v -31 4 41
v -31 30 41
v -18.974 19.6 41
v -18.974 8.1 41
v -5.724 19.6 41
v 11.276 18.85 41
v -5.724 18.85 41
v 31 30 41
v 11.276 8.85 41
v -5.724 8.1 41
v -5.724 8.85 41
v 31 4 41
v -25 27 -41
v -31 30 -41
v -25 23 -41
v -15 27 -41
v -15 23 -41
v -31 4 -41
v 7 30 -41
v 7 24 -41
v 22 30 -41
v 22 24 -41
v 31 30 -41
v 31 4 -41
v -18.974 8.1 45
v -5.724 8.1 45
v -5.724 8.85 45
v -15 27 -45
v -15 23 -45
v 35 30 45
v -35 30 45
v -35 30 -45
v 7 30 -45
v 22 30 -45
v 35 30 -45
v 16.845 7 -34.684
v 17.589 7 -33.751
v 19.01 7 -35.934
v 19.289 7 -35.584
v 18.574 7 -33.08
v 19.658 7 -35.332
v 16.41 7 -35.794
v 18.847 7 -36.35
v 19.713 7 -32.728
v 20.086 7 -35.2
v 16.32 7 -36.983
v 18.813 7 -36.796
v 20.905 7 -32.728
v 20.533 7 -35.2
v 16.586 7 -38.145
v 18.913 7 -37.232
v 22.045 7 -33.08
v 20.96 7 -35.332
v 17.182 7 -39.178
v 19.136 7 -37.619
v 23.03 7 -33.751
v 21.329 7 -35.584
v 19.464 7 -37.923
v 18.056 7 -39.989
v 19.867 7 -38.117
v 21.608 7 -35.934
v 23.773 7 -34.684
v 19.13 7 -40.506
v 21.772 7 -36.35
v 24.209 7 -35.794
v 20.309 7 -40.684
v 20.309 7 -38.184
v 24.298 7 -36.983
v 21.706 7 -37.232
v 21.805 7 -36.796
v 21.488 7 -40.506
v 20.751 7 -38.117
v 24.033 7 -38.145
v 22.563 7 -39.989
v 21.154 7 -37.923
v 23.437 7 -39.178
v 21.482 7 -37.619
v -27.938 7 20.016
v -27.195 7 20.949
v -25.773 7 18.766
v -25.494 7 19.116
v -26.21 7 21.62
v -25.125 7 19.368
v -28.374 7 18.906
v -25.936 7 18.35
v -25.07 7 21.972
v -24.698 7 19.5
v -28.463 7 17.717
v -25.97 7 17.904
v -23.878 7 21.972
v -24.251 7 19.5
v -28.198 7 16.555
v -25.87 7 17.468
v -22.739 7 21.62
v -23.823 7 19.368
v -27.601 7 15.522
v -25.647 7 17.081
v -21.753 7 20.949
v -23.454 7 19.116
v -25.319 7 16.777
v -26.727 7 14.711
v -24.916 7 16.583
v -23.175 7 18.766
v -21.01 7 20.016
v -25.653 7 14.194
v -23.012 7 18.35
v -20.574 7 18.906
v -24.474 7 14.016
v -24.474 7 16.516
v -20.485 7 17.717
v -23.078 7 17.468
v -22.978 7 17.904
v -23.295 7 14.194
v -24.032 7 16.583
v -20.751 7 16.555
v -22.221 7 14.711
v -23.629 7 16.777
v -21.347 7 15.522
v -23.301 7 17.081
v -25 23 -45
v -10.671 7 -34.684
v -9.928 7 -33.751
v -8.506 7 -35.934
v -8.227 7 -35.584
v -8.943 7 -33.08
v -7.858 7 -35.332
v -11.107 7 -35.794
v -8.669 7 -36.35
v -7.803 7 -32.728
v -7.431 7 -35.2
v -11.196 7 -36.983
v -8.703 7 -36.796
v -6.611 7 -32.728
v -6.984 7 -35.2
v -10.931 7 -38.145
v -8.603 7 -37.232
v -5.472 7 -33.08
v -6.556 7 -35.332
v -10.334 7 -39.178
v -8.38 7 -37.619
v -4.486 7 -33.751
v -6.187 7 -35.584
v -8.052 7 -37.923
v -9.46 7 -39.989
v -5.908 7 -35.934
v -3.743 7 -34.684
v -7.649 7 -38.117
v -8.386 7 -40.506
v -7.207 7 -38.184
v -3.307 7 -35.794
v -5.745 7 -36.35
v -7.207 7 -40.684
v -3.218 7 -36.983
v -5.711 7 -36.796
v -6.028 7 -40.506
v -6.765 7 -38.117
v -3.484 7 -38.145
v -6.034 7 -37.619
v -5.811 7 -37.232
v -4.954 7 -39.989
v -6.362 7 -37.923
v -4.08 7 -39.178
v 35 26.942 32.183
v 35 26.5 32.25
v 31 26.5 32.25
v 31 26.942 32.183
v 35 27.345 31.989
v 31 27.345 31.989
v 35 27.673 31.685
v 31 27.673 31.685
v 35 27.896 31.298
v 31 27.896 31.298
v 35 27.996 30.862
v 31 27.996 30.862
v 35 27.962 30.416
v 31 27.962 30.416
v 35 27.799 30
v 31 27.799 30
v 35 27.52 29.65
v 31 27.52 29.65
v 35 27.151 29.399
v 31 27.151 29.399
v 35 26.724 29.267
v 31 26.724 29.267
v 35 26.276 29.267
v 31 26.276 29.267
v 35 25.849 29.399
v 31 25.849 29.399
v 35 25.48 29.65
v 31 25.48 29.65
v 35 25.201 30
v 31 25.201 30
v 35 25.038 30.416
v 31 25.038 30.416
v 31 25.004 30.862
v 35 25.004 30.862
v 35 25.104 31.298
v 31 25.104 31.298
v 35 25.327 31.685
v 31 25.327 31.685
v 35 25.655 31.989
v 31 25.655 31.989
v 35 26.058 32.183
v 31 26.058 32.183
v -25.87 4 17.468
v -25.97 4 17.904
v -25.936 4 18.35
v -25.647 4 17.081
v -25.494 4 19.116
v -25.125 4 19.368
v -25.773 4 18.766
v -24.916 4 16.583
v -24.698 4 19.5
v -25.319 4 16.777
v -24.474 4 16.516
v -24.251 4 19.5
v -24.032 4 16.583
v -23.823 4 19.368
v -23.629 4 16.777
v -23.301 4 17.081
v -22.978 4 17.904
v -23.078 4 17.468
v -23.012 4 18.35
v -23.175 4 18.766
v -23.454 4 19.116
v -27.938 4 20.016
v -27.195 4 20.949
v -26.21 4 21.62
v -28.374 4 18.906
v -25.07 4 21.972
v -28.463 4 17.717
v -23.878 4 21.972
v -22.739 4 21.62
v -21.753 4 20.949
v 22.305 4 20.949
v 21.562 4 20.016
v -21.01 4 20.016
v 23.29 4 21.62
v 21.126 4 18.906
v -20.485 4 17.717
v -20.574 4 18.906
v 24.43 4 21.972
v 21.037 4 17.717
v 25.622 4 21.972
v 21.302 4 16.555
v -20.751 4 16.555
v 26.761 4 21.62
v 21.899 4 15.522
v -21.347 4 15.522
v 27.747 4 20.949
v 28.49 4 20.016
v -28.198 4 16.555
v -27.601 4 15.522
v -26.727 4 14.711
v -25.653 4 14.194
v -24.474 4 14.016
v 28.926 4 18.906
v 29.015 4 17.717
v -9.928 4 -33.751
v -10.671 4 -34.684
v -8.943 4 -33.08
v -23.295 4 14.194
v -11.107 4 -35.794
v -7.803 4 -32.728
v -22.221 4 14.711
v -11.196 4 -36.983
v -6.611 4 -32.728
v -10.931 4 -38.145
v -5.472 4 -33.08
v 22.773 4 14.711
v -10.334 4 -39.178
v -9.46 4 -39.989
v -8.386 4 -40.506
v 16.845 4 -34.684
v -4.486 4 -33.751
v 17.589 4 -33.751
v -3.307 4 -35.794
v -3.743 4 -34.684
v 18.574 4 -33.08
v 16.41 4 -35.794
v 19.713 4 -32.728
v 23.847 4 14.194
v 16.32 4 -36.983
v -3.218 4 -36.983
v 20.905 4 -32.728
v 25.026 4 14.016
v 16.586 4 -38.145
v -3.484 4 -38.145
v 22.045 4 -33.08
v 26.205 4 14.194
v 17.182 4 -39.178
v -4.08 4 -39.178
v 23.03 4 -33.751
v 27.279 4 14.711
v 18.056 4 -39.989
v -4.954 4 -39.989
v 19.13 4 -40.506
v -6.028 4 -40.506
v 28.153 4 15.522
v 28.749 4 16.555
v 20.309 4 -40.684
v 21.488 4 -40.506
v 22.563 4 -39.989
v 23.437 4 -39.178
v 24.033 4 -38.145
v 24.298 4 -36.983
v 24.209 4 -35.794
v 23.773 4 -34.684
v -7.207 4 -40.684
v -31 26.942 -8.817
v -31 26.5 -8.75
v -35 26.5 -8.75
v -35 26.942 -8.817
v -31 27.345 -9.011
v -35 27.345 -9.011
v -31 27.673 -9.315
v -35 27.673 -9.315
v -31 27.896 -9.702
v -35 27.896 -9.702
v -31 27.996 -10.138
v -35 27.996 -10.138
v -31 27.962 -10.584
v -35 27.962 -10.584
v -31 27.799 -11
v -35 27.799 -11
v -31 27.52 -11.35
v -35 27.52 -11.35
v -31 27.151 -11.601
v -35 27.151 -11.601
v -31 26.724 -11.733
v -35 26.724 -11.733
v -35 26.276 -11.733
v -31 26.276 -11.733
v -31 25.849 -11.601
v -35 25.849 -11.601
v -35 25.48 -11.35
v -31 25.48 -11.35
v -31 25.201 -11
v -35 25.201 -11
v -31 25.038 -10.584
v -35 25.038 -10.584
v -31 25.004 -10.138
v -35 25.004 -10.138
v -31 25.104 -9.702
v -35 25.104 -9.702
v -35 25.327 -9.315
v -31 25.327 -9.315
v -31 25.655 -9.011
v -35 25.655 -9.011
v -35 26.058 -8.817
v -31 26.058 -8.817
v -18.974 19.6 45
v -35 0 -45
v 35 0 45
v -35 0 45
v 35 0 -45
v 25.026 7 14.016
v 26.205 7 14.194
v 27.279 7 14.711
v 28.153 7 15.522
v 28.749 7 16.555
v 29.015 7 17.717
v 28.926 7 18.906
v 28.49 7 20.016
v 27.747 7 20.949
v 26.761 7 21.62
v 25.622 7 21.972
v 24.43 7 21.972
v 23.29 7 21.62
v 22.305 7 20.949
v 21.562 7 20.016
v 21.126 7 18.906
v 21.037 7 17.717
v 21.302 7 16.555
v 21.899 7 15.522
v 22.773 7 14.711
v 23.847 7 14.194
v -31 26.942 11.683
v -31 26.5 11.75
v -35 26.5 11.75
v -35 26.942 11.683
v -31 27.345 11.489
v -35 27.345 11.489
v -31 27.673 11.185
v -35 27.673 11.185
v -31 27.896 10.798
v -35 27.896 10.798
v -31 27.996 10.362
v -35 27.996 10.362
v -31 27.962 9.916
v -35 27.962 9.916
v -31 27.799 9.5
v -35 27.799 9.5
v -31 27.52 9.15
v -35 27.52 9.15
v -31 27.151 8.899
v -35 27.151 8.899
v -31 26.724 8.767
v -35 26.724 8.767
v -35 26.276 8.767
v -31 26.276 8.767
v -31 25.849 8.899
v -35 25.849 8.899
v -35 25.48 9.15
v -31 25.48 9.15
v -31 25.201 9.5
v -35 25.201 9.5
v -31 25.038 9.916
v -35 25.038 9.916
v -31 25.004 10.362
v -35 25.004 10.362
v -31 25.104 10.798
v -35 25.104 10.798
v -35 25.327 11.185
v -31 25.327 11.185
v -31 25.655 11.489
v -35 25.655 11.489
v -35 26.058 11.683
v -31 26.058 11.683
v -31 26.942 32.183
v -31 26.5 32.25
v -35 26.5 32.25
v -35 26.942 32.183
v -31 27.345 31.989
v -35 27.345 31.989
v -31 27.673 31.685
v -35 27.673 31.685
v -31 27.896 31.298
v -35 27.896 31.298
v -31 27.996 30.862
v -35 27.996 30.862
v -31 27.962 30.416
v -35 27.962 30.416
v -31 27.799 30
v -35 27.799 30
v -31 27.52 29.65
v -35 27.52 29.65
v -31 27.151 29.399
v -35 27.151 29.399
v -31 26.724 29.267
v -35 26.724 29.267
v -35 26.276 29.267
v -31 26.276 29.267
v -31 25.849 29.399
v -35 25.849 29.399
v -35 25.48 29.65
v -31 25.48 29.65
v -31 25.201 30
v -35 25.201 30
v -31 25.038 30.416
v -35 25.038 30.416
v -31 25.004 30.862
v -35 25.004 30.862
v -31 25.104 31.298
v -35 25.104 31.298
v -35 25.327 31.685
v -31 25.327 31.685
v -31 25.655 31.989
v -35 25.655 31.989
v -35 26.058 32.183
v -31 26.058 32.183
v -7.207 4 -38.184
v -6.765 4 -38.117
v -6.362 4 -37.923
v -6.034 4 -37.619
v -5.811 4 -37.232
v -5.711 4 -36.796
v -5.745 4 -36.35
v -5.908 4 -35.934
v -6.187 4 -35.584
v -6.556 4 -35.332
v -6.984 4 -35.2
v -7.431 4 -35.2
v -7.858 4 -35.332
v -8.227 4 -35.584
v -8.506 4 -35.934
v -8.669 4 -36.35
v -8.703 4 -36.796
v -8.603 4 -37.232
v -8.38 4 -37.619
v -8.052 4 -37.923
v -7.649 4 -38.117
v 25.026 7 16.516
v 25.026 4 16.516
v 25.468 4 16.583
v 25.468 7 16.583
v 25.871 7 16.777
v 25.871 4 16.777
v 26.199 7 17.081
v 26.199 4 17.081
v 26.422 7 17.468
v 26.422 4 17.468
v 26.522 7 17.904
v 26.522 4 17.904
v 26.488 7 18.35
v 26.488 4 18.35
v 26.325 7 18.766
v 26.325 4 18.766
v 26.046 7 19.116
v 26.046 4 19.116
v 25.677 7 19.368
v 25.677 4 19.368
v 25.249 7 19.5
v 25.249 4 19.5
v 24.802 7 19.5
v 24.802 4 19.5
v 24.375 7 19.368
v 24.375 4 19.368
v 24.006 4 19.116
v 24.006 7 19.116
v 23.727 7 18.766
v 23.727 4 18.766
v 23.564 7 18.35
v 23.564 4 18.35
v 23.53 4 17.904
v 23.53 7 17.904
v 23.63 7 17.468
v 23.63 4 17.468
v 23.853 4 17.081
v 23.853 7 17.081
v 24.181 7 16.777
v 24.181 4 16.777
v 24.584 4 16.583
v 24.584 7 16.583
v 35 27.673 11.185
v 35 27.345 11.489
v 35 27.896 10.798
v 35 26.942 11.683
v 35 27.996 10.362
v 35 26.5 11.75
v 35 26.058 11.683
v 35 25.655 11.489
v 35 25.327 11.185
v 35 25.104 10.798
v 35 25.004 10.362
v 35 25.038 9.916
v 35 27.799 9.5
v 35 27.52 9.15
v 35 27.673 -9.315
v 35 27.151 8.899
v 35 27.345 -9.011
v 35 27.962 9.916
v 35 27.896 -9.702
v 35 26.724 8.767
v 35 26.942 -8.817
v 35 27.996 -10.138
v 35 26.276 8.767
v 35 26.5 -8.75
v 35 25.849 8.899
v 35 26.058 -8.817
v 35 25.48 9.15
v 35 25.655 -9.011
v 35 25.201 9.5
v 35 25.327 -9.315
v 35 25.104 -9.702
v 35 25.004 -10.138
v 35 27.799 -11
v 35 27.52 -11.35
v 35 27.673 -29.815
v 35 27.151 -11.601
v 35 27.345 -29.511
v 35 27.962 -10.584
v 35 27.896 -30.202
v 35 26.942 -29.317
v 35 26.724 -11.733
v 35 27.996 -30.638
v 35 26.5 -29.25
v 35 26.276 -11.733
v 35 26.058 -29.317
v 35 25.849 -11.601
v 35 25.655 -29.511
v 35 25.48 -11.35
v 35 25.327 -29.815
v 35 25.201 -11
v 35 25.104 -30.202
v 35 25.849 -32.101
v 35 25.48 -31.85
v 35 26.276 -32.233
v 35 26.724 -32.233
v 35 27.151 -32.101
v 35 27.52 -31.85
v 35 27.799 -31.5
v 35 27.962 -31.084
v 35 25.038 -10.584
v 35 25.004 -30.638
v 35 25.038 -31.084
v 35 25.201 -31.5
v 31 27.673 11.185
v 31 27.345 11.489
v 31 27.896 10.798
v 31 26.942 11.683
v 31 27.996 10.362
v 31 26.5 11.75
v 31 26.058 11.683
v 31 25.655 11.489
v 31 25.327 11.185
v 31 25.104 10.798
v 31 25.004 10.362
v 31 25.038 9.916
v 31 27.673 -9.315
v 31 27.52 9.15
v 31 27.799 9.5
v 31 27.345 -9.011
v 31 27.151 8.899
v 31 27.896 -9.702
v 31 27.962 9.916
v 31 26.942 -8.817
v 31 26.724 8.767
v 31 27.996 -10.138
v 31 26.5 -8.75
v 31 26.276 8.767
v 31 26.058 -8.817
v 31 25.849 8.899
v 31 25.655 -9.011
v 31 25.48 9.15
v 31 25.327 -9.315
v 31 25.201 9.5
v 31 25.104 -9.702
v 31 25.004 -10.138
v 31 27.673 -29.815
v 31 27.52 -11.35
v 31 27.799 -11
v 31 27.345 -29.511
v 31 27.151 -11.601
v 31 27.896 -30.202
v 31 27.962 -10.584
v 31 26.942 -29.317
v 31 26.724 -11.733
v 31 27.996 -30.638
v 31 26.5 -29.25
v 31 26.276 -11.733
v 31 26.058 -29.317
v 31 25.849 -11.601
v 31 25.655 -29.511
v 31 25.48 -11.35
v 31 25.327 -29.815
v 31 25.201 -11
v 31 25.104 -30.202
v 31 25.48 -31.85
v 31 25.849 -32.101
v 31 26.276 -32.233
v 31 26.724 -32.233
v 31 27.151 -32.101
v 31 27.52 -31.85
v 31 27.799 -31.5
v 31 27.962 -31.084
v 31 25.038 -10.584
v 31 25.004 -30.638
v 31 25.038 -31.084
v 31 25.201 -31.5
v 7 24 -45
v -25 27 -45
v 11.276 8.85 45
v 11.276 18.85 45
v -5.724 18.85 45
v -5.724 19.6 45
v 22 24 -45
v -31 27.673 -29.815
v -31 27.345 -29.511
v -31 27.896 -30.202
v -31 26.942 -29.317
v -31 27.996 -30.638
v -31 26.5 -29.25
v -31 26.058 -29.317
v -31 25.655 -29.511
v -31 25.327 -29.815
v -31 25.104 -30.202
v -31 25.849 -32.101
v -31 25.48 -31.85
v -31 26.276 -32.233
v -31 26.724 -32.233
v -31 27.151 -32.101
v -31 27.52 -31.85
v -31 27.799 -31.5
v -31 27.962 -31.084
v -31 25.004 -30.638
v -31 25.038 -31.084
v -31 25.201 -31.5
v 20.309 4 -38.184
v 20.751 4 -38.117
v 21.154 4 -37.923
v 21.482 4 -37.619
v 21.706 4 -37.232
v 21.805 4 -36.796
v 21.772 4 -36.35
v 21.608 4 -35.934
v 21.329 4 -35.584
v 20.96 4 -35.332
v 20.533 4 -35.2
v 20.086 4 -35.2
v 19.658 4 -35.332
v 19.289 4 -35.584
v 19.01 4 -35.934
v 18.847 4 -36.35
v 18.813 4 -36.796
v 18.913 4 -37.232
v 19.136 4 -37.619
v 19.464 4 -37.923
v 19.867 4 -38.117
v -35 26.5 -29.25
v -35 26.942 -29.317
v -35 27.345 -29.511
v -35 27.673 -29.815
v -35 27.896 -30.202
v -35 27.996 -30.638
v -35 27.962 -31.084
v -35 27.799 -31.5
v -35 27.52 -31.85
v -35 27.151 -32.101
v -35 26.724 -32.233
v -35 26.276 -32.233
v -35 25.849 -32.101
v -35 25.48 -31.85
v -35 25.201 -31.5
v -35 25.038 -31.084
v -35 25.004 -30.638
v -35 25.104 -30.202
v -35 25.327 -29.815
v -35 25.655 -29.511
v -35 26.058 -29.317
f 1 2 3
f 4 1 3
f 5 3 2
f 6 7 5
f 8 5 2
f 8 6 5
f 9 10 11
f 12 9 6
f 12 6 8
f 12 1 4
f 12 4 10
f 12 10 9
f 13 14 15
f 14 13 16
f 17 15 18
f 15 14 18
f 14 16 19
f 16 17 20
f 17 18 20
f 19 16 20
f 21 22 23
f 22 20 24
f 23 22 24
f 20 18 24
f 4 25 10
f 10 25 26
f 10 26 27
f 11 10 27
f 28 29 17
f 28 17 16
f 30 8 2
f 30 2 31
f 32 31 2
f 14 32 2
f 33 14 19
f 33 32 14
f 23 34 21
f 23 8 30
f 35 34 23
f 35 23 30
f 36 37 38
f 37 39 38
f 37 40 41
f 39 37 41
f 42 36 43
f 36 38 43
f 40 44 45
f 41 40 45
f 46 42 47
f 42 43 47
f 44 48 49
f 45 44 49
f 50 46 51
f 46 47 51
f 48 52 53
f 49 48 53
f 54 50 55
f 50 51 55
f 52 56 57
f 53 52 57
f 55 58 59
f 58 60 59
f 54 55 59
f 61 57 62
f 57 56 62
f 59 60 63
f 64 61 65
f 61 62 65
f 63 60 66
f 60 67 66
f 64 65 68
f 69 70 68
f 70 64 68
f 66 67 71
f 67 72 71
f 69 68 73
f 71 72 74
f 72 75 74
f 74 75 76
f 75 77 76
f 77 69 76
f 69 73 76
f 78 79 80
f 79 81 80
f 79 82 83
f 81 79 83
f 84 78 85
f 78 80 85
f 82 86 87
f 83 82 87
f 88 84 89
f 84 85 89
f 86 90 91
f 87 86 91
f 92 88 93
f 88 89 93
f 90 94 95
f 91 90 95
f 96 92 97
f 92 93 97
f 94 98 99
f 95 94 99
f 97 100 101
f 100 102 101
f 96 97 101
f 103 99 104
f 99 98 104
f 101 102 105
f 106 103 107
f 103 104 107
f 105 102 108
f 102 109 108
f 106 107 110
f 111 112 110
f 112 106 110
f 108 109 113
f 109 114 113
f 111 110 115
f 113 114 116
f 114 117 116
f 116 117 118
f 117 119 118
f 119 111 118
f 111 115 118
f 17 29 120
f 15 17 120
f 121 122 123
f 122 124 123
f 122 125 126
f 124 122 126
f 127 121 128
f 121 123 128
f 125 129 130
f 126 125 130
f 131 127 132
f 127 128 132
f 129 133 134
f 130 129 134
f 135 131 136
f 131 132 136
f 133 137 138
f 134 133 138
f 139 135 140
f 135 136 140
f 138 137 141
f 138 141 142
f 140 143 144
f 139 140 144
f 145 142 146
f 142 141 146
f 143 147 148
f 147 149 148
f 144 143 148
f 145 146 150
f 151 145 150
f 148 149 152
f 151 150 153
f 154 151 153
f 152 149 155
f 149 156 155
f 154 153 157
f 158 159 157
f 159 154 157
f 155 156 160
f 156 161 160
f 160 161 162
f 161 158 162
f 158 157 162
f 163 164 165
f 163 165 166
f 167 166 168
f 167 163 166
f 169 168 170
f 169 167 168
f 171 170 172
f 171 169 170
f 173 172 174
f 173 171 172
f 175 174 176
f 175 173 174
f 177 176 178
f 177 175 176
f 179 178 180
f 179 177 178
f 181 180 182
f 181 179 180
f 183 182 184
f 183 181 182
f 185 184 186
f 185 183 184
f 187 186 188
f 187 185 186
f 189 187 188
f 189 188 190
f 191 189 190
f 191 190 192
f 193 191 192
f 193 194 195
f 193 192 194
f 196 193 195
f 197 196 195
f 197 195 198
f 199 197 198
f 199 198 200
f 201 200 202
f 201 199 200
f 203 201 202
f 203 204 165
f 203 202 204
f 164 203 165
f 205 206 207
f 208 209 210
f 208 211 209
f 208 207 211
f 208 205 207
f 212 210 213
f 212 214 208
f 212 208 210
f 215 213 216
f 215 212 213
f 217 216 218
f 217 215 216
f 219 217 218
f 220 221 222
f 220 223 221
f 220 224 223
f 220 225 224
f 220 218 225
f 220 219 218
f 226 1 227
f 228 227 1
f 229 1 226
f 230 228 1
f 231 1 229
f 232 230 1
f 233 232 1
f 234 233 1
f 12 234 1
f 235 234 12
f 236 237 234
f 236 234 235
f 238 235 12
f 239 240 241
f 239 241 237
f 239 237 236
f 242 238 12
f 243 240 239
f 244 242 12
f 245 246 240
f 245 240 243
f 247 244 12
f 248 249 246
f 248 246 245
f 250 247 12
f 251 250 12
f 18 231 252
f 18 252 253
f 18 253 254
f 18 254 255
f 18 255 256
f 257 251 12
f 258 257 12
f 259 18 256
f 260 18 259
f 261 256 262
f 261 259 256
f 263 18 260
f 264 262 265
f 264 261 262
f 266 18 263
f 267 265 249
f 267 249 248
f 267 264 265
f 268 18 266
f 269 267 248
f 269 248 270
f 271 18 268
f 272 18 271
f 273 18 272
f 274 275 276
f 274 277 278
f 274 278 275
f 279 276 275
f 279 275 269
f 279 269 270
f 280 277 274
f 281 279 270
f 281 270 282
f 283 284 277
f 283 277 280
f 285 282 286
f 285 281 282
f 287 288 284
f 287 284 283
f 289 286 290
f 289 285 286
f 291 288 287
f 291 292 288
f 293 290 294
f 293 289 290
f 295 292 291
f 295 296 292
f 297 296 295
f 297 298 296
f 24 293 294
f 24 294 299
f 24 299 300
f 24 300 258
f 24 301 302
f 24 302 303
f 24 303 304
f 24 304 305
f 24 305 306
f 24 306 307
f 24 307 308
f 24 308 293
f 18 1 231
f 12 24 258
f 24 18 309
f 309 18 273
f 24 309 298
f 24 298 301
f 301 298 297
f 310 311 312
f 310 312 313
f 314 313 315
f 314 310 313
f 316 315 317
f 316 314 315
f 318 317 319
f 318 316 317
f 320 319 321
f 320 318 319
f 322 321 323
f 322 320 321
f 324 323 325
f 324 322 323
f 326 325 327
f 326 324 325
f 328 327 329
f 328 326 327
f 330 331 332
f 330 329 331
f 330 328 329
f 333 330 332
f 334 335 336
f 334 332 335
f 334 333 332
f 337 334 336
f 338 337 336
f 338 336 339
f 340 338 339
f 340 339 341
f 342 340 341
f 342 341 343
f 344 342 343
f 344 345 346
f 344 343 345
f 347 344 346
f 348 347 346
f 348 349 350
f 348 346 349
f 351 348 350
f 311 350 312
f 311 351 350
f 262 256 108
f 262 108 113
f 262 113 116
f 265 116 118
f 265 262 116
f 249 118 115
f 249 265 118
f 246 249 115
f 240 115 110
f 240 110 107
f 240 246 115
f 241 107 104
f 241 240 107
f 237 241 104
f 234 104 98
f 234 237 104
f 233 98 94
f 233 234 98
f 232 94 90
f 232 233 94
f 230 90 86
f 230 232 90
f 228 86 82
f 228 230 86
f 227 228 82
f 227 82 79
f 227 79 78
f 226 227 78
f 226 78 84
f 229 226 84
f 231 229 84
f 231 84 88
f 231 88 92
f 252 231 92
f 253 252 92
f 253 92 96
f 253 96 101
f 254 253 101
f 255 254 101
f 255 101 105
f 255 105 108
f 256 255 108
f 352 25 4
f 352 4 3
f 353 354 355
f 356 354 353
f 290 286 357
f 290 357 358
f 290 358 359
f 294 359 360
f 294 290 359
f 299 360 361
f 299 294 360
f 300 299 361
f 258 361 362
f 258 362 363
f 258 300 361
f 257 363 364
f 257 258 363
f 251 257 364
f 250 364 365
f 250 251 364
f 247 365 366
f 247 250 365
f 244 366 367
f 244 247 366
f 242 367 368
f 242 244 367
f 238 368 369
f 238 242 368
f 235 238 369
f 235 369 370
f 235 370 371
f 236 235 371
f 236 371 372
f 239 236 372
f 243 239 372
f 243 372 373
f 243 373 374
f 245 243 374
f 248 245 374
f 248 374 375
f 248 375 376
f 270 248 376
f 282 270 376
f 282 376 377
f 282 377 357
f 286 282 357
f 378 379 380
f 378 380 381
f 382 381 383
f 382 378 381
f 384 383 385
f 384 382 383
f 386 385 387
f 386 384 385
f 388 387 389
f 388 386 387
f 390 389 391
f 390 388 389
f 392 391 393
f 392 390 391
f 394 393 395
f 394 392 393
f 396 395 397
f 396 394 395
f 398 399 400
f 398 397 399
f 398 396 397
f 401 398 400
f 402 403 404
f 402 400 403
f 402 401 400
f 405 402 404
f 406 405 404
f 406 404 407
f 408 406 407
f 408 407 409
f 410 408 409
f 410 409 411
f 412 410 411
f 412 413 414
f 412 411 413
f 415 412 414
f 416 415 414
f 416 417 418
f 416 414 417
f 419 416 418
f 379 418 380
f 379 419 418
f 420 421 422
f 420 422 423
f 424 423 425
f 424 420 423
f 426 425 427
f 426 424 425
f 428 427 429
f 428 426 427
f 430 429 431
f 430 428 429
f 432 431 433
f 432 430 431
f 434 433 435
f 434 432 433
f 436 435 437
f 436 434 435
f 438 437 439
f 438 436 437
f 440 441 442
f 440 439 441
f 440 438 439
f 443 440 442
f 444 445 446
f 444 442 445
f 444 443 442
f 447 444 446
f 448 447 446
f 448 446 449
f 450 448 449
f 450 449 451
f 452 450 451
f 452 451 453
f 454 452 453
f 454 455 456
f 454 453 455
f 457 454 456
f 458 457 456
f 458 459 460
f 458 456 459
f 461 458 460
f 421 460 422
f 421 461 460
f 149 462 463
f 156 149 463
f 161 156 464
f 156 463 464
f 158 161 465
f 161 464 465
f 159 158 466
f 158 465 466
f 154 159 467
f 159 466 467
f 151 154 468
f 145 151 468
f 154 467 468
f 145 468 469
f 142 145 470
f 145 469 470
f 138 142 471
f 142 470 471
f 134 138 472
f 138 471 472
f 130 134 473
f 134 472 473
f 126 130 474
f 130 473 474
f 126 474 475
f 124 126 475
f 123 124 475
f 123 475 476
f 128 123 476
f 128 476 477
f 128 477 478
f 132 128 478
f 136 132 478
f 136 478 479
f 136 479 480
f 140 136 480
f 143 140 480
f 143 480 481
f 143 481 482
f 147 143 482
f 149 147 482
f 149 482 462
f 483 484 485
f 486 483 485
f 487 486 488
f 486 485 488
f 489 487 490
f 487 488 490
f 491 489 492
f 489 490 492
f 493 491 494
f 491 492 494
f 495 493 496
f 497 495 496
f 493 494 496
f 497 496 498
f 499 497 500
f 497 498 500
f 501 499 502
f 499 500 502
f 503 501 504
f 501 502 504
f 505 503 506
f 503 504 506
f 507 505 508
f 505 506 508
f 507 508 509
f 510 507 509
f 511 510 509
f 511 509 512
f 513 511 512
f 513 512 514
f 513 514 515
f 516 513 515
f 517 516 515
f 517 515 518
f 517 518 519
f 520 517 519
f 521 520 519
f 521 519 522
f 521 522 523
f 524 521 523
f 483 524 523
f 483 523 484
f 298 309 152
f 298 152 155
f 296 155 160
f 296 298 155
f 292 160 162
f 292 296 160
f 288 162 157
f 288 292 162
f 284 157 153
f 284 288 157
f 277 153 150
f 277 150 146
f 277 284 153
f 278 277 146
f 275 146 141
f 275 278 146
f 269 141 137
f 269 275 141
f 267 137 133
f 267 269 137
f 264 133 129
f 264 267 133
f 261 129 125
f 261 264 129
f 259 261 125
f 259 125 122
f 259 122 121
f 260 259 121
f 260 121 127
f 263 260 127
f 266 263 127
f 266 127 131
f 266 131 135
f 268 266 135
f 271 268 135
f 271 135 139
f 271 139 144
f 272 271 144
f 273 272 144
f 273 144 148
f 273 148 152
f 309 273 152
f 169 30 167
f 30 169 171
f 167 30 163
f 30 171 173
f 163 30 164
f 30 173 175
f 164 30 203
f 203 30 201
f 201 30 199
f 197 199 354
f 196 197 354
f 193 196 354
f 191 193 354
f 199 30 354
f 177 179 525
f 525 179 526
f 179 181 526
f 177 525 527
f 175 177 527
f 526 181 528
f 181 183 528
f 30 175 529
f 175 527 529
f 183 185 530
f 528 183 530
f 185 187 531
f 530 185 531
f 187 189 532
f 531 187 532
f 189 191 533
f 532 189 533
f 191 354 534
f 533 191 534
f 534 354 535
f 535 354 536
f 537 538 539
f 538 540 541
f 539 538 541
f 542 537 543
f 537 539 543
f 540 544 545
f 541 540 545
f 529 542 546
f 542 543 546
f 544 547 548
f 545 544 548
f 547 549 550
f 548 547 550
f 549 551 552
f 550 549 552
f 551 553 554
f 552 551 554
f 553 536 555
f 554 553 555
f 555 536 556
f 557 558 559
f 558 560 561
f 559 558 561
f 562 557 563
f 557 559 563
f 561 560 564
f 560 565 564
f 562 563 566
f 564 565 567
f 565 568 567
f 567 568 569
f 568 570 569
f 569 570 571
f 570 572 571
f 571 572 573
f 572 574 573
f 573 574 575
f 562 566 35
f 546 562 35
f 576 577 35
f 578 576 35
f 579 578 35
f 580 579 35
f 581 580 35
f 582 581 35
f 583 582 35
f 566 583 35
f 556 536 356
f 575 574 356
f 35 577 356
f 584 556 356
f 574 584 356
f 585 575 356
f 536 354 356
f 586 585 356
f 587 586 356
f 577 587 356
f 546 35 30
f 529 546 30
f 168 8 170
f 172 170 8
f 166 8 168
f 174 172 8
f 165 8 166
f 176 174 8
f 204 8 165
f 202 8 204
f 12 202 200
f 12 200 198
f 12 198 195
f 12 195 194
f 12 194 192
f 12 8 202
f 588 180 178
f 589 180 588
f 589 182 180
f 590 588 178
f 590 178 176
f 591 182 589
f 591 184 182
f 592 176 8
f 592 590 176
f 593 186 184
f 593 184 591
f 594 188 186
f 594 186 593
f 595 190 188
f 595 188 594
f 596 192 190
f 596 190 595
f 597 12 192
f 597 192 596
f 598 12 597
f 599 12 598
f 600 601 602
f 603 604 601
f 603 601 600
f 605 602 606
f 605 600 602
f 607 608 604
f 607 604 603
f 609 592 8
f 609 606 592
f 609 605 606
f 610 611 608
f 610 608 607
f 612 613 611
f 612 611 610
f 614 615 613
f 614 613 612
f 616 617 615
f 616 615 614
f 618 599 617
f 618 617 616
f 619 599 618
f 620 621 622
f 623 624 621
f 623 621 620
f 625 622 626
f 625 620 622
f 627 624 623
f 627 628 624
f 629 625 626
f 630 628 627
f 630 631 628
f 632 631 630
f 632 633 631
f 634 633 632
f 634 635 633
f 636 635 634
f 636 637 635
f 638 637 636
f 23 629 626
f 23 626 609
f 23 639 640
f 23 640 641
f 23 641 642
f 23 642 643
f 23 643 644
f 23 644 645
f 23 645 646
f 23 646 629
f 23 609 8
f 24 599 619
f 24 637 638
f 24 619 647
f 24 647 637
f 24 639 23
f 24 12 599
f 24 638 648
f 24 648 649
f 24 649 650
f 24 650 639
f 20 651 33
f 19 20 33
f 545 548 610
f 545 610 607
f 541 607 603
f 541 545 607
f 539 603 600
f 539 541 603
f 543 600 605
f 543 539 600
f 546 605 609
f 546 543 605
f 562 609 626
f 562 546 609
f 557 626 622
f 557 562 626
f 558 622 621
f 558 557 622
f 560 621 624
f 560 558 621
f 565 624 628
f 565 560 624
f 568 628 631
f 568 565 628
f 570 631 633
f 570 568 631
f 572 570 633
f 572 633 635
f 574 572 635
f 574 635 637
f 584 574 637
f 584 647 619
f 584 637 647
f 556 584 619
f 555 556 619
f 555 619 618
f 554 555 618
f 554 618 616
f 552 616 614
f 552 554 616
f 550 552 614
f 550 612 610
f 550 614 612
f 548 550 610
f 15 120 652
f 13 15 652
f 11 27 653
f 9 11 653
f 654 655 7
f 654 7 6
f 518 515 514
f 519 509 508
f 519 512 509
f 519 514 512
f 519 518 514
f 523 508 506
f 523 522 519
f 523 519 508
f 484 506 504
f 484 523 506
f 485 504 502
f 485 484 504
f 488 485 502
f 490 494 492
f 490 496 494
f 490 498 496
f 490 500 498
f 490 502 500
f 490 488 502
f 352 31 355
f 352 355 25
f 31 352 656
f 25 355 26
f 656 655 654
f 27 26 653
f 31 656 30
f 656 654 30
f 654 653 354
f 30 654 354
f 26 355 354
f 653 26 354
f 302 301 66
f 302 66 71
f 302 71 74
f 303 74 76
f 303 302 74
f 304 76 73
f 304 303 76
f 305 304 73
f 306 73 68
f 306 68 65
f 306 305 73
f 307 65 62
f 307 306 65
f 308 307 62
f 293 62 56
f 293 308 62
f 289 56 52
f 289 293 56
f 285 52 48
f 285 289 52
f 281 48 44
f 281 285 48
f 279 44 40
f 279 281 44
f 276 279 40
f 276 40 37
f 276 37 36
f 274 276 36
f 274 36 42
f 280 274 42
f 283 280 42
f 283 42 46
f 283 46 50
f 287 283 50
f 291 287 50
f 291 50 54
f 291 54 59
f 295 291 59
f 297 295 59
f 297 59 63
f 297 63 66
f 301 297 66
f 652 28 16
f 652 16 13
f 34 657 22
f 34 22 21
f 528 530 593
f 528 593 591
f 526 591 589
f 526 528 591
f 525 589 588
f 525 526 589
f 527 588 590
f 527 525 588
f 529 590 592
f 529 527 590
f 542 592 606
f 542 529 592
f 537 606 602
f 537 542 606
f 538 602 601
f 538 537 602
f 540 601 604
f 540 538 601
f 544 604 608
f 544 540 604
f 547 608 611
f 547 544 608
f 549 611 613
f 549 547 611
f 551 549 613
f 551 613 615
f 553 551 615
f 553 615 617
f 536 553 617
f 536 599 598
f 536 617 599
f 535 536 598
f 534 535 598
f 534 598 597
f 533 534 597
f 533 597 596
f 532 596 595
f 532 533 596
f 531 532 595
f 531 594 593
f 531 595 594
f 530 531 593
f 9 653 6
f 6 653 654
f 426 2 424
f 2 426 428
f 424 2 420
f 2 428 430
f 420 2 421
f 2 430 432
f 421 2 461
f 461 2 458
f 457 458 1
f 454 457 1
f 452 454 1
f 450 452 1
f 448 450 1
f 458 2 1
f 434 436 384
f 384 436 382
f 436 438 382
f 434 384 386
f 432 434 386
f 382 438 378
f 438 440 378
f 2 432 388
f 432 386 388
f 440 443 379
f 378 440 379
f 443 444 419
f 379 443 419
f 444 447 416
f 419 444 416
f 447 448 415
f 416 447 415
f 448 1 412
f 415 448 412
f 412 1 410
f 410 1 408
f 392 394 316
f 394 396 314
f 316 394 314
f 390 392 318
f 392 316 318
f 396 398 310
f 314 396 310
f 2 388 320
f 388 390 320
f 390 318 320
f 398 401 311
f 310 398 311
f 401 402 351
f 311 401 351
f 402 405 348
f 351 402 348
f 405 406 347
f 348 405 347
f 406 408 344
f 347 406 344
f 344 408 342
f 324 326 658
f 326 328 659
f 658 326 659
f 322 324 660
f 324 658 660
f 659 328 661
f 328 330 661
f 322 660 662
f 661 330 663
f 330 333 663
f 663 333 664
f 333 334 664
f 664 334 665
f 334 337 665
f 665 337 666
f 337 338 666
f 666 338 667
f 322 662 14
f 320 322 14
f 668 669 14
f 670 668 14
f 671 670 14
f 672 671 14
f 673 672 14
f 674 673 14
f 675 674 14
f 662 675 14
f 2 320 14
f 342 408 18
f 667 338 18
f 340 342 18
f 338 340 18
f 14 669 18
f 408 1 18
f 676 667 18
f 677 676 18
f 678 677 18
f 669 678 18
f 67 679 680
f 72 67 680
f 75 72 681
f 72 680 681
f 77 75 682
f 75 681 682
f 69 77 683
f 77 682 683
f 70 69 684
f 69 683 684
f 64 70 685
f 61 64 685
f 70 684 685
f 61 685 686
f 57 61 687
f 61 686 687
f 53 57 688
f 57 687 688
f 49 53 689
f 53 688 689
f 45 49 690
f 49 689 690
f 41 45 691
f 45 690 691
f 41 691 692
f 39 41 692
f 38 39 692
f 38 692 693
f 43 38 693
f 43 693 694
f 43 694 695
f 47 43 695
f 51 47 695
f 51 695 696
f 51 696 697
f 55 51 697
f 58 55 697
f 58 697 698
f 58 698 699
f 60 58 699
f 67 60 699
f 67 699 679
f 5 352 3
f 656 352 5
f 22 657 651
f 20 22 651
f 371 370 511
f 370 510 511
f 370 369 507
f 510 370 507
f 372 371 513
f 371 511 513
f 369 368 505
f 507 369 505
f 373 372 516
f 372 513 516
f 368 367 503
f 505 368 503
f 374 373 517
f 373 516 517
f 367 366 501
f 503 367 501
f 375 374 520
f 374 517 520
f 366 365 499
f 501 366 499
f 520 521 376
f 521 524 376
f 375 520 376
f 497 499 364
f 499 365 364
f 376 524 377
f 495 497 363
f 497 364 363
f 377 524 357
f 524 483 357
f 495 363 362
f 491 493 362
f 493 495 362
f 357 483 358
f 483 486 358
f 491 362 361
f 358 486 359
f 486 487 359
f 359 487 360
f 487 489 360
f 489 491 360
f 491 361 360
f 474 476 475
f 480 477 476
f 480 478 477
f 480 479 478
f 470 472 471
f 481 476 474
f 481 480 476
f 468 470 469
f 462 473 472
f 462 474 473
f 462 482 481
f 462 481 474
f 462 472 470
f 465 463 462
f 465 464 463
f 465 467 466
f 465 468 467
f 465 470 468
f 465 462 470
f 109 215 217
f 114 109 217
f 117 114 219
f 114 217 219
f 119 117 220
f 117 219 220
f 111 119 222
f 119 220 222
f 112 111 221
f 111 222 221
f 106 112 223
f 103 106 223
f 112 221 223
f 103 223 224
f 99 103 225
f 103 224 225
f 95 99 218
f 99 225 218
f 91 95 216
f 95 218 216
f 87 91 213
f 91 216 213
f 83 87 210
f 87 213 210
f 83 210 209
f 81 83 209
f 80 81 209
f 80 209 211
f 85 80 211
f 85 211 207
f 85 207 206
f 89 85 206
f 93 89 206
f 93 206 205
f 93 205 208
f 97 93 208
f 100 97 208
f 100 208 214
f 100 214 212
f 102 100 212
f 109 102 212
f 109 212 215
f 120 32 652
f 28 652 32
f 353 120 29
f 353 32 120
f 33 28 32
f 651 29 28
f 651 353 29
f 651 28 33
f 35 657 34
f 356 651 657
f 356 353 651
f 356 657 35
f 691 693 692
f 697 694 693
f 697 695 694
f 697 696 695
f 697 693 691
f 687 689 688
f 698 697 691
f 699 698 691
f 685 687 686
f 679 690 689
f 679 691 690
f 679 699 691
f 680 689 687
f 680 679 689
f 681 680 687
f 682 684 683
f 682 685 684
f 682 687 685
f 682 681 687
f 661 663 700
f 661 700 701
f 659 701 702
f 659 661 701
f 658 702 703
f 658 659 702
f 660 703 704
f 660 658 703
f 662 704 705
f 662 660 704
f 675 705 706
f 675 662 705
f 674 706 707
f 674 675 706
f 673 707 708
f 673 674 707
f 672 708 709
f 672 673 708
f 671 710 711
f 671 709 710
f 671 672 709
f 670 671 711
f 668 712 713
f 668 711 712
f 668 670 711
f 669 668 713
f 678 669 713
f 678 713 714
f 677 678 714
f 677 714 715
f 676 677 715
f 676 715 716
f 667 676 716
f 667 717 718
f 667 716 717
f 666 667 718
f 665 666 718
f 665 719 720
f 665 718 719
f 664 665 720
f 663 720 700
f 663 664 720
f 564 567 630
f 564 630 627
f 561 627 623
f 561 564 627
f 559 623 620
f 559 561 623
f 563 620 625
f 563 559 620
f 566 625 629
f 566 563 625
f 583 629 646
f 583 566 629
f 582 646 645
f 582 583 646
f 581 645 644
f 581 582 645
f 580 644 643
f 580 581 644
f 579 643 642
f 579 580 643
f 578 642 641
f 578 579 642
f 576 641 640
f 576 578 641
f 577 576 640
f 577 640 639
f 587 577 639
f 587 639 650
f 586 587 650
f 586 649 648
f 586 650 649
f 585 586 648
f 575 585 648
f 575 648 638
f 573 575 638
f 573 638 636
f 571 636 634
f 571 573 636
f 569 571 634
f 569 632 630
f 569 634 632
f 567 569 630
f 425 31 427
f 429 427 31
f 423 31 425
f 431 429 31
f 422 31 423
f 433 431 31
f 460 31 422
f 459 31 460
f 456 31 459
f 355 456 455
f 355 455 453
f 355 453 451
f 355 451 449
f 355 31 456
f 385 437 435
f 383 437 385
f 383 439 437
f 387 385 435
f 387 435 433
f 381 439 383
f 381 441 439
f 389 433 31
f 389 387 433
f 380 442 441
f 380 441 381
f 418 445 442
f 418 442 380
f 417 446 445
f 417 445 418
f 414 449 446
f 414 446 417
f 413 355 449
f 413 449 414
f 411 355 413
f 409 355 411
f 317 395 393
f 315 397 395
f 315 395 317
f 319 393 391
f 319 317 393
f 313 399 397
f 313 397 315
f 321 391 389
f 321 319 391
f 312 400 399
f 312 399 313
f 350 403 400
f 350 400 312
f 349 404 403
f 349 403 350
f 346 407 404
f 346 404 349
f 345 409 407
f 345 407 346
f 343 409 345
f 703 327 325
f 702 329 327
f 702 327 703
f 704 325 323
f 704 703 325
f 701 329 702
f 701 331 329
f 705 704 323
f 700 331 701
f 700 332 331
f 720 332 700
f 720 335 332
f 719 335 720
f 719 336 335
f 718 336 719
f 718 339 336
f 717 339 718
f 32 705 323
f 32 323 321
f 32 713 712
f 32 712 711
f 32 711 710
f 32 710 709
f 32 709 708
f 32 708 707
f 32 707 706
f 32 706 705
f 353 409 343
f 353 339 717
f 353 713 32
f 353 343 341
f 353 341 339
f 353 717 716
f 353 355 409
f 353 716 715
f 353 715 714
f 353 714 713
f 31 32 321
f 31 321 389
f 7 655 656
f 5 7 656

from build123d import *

# Parameters (mm, degrees)
SKETCH1_W               = 70
SKETCH1_H               = 90
BOSS_EXTRUDE1_DEPTH     = 30
SHELL1_T                = -4
SKETCH2_W               = 13.25
SKETCH2_H               = 11.5
SKETCH2_W_2             = 11.25
SKETCH2_H_2             = 9.5
CUT_EXTRUDE1_DEPTH      = 7
SKETCH3_W               = 18
SKETCH3_H               = 10
CUT_EXTRUDE2_DEPTH      = 7
SKETCH4_W               = 15
SKETCH4_H               = 6
CUT_EXTRUDE3_DEPTH      = 7
SKETCH6_R               = 4
SKETCH6_R_2             = 1.5
BOSS_EXTRUDE2_DEPTH     = 7
CUT_EXTRUDE4_DEPTH      = 86.32877592
CUT_EXTRUDE4_DEPTH_BACK = 86.32877592
SKETCH7_R               = 1.5
SKETCH8_W               = 10
SKETCH8_H               = 4
CUT_EXTRUDE5_DEPTH      = 7


with BuildPart() as part:
    # Sketch1 → Boss-Extrude1 (new body)
    with BuildSketch(Plane(origin=(0, 0, 0), x_dir=(1, 0, 0), z_dir=(0, 1, 0))):
        Rectangle(SKETCH1_W, SKETCH1_H)
    extrude(amount=BOSS_EXTRUDE1_DEPTH)

    # Shell1
    shell1_openings = [part.faces().sort_by_distance(p)[0] for p in [
        (0, 30, 0),
    ]]
    offset(amount=SHELL1_T, openings=shell1_openings, kind=Kind.INTERSECTION)

    # Sketch2 → Cut-Extrude1 (cut)
    # profile 1 of 2: a face of its own
    with BuildSketch(Plane.XY.offset(45)):
        with Locations((-12.349103725, 13.85)):
            Rectangle(SKETCH2_W, SKETCH2_H)
        with Locations((-12.349103725, 13.85)):
            Rectangle(SKETCH2_W_2, SKETCH2_H_2, mode=Mode.SUBTRACT)
    # profile 2 of 2: a face of its own
    with BuildSketch(Plane.XY.offset(45)):
        with Locations((-12.349103725, 13.85)):
            Rectangle(SKETCH2_W_2, SKETCH2_H_2)
    extrude(amount=-CUT_EXTRUDE1_DEPTH, mode=Mode.SUBTRACT)

    # Sketch3 → Cut-Extrude2 (cut)
    with BuildSketch(Plane.XY.offset(45)):
        with Locations((2.275896275, 13.85)):
            Rectangle(SKETCH3_W, SKETCH3_H)
    extrude(amount=-CUT_EXTRUDE2_DEPTH, mode=Mode.SUBTRACT)

    # Sketch4 → Cut-Extrude3 (cut)
    with BuildSketch(Plane(origin=(0, 0, -45), x_dir=(-1, 0, 0), z_dir=(0, 0, -1))):
        with Locations((-14.5, 27)):
            Rectangle(SKETCH4_W, SKETCH4_H)
    extrude(amount=-CUT_EXTRUDE3_DEPTH, mode=Mode.SUBTRACT)

    # Sketch6 → Boss-Extrude2 (add)
    # profile 1 of 4: a face of its own
    with BuildSketch(Plane(origin=(0, 0, -1.719487256), x_dir=(1, 0, 0), z_dir=(0, -1, 0))):
        with Locations(Location((-24.474103725, 19.735790835, 0), (0, 0, 270))):
            Circle(SKETCH6_R)
        with Locations(Location((-24.474103725, 19.735790835, 0), (0, 0, 270))):
            Circle(SKETCH6_R_2, mode=Mode.SUBTRACT)
    # profile 2 of 4: a face of its own
    with BuildSketch(Plane(origin=(0, 0, -1.719487256), x_dir=(1, 0, 0), z_dir=(0, -1, 0))):
        with Locations(Location((25.025896275, 19.735790835, 0), (0, 0, 270))):
            Circle(SKETCH6_R)
        with Locations(Location((25.025896275, 19.735790835, 0), (0, 0, 270))):
            Circle(SKETCH6_R_2, mode=Mode.SUBTRACT)
    # profile 3 of 4: a face of its own
    with BuildSketch(Plane(origin=(0, 0, -1.719487256), x_dir=(1, 0, 0), z_dir=(0, -1, 0))):
        with Locations(Location((20.309236753, -34.964209165, 0), (0, 0, 270))):
            Circle(SKETCH6_R)
        with Locations(Location((20.309236753, -34.964209165, 0), (0, 0, 270))):
            Circle(SKETCH6_R_2, mode=Mode.SUBTRACT)
    # profile 4 of 4: a face of its own
    with BuildSketch(Plane(origin=(0, 0, -1.719487256), x_dir=(1, 0, 0), z_dir=(0, -1, 0))):
        with Locations(Location((-7.207089355, -34.964209165, 0), (0, 0, 270))):
            Circle(SKETCH6_R)
        with Locations(Location((-7.207089355, -34.964209165, 0), (0, 0, 270))):
            Circle(SKETCH6_R_2, mode=Mode.SUBTRACT)
    extrude(amount=-BOSS_EXTRUDE2_DEPTH)

    # Sketch7 → Cut-Extrude4 (cut, two sides: drawn at the far end of the back side and taken through both)
    with BuildSketch(Plane.ZY.offset(-31).offset(-CUT_EXTRUDE4_DEPTH_BACK)):
        with Locations((-30.75, 26.5)):
            Circle(SKETCH7_R)
        with Locations((-10.25, 26.5)):
            Circle(SKETCH7_R)
        with Locations((10.25, 26.5)):
            Circle(SKETCH7_R)
        with Locations((30.75, 26.5)):
            Circle(SKETCH7_R)
    extrude(amount=CUT_EXTRUDE4_DEPTH + CUT_EXTRUDE4_DEPTH_BACK, mode=Mode.SUBTRACT)

    # Sketch8 → Cut-Extrude5 (cut)
    with BuildSketch(Plane(origin=(0, 0, -45), x_dir=(-1, 0, 0), z_dir=(0, 0, -1))):
        with Locations((20, 25)):
            Rectangle(SKETCH8_W, SKETCH8_H)
    extrude(amount=-CUT_EXTRUDE5_DEPTH, mode=Mode.SUBTRACT)


solid = part.part
